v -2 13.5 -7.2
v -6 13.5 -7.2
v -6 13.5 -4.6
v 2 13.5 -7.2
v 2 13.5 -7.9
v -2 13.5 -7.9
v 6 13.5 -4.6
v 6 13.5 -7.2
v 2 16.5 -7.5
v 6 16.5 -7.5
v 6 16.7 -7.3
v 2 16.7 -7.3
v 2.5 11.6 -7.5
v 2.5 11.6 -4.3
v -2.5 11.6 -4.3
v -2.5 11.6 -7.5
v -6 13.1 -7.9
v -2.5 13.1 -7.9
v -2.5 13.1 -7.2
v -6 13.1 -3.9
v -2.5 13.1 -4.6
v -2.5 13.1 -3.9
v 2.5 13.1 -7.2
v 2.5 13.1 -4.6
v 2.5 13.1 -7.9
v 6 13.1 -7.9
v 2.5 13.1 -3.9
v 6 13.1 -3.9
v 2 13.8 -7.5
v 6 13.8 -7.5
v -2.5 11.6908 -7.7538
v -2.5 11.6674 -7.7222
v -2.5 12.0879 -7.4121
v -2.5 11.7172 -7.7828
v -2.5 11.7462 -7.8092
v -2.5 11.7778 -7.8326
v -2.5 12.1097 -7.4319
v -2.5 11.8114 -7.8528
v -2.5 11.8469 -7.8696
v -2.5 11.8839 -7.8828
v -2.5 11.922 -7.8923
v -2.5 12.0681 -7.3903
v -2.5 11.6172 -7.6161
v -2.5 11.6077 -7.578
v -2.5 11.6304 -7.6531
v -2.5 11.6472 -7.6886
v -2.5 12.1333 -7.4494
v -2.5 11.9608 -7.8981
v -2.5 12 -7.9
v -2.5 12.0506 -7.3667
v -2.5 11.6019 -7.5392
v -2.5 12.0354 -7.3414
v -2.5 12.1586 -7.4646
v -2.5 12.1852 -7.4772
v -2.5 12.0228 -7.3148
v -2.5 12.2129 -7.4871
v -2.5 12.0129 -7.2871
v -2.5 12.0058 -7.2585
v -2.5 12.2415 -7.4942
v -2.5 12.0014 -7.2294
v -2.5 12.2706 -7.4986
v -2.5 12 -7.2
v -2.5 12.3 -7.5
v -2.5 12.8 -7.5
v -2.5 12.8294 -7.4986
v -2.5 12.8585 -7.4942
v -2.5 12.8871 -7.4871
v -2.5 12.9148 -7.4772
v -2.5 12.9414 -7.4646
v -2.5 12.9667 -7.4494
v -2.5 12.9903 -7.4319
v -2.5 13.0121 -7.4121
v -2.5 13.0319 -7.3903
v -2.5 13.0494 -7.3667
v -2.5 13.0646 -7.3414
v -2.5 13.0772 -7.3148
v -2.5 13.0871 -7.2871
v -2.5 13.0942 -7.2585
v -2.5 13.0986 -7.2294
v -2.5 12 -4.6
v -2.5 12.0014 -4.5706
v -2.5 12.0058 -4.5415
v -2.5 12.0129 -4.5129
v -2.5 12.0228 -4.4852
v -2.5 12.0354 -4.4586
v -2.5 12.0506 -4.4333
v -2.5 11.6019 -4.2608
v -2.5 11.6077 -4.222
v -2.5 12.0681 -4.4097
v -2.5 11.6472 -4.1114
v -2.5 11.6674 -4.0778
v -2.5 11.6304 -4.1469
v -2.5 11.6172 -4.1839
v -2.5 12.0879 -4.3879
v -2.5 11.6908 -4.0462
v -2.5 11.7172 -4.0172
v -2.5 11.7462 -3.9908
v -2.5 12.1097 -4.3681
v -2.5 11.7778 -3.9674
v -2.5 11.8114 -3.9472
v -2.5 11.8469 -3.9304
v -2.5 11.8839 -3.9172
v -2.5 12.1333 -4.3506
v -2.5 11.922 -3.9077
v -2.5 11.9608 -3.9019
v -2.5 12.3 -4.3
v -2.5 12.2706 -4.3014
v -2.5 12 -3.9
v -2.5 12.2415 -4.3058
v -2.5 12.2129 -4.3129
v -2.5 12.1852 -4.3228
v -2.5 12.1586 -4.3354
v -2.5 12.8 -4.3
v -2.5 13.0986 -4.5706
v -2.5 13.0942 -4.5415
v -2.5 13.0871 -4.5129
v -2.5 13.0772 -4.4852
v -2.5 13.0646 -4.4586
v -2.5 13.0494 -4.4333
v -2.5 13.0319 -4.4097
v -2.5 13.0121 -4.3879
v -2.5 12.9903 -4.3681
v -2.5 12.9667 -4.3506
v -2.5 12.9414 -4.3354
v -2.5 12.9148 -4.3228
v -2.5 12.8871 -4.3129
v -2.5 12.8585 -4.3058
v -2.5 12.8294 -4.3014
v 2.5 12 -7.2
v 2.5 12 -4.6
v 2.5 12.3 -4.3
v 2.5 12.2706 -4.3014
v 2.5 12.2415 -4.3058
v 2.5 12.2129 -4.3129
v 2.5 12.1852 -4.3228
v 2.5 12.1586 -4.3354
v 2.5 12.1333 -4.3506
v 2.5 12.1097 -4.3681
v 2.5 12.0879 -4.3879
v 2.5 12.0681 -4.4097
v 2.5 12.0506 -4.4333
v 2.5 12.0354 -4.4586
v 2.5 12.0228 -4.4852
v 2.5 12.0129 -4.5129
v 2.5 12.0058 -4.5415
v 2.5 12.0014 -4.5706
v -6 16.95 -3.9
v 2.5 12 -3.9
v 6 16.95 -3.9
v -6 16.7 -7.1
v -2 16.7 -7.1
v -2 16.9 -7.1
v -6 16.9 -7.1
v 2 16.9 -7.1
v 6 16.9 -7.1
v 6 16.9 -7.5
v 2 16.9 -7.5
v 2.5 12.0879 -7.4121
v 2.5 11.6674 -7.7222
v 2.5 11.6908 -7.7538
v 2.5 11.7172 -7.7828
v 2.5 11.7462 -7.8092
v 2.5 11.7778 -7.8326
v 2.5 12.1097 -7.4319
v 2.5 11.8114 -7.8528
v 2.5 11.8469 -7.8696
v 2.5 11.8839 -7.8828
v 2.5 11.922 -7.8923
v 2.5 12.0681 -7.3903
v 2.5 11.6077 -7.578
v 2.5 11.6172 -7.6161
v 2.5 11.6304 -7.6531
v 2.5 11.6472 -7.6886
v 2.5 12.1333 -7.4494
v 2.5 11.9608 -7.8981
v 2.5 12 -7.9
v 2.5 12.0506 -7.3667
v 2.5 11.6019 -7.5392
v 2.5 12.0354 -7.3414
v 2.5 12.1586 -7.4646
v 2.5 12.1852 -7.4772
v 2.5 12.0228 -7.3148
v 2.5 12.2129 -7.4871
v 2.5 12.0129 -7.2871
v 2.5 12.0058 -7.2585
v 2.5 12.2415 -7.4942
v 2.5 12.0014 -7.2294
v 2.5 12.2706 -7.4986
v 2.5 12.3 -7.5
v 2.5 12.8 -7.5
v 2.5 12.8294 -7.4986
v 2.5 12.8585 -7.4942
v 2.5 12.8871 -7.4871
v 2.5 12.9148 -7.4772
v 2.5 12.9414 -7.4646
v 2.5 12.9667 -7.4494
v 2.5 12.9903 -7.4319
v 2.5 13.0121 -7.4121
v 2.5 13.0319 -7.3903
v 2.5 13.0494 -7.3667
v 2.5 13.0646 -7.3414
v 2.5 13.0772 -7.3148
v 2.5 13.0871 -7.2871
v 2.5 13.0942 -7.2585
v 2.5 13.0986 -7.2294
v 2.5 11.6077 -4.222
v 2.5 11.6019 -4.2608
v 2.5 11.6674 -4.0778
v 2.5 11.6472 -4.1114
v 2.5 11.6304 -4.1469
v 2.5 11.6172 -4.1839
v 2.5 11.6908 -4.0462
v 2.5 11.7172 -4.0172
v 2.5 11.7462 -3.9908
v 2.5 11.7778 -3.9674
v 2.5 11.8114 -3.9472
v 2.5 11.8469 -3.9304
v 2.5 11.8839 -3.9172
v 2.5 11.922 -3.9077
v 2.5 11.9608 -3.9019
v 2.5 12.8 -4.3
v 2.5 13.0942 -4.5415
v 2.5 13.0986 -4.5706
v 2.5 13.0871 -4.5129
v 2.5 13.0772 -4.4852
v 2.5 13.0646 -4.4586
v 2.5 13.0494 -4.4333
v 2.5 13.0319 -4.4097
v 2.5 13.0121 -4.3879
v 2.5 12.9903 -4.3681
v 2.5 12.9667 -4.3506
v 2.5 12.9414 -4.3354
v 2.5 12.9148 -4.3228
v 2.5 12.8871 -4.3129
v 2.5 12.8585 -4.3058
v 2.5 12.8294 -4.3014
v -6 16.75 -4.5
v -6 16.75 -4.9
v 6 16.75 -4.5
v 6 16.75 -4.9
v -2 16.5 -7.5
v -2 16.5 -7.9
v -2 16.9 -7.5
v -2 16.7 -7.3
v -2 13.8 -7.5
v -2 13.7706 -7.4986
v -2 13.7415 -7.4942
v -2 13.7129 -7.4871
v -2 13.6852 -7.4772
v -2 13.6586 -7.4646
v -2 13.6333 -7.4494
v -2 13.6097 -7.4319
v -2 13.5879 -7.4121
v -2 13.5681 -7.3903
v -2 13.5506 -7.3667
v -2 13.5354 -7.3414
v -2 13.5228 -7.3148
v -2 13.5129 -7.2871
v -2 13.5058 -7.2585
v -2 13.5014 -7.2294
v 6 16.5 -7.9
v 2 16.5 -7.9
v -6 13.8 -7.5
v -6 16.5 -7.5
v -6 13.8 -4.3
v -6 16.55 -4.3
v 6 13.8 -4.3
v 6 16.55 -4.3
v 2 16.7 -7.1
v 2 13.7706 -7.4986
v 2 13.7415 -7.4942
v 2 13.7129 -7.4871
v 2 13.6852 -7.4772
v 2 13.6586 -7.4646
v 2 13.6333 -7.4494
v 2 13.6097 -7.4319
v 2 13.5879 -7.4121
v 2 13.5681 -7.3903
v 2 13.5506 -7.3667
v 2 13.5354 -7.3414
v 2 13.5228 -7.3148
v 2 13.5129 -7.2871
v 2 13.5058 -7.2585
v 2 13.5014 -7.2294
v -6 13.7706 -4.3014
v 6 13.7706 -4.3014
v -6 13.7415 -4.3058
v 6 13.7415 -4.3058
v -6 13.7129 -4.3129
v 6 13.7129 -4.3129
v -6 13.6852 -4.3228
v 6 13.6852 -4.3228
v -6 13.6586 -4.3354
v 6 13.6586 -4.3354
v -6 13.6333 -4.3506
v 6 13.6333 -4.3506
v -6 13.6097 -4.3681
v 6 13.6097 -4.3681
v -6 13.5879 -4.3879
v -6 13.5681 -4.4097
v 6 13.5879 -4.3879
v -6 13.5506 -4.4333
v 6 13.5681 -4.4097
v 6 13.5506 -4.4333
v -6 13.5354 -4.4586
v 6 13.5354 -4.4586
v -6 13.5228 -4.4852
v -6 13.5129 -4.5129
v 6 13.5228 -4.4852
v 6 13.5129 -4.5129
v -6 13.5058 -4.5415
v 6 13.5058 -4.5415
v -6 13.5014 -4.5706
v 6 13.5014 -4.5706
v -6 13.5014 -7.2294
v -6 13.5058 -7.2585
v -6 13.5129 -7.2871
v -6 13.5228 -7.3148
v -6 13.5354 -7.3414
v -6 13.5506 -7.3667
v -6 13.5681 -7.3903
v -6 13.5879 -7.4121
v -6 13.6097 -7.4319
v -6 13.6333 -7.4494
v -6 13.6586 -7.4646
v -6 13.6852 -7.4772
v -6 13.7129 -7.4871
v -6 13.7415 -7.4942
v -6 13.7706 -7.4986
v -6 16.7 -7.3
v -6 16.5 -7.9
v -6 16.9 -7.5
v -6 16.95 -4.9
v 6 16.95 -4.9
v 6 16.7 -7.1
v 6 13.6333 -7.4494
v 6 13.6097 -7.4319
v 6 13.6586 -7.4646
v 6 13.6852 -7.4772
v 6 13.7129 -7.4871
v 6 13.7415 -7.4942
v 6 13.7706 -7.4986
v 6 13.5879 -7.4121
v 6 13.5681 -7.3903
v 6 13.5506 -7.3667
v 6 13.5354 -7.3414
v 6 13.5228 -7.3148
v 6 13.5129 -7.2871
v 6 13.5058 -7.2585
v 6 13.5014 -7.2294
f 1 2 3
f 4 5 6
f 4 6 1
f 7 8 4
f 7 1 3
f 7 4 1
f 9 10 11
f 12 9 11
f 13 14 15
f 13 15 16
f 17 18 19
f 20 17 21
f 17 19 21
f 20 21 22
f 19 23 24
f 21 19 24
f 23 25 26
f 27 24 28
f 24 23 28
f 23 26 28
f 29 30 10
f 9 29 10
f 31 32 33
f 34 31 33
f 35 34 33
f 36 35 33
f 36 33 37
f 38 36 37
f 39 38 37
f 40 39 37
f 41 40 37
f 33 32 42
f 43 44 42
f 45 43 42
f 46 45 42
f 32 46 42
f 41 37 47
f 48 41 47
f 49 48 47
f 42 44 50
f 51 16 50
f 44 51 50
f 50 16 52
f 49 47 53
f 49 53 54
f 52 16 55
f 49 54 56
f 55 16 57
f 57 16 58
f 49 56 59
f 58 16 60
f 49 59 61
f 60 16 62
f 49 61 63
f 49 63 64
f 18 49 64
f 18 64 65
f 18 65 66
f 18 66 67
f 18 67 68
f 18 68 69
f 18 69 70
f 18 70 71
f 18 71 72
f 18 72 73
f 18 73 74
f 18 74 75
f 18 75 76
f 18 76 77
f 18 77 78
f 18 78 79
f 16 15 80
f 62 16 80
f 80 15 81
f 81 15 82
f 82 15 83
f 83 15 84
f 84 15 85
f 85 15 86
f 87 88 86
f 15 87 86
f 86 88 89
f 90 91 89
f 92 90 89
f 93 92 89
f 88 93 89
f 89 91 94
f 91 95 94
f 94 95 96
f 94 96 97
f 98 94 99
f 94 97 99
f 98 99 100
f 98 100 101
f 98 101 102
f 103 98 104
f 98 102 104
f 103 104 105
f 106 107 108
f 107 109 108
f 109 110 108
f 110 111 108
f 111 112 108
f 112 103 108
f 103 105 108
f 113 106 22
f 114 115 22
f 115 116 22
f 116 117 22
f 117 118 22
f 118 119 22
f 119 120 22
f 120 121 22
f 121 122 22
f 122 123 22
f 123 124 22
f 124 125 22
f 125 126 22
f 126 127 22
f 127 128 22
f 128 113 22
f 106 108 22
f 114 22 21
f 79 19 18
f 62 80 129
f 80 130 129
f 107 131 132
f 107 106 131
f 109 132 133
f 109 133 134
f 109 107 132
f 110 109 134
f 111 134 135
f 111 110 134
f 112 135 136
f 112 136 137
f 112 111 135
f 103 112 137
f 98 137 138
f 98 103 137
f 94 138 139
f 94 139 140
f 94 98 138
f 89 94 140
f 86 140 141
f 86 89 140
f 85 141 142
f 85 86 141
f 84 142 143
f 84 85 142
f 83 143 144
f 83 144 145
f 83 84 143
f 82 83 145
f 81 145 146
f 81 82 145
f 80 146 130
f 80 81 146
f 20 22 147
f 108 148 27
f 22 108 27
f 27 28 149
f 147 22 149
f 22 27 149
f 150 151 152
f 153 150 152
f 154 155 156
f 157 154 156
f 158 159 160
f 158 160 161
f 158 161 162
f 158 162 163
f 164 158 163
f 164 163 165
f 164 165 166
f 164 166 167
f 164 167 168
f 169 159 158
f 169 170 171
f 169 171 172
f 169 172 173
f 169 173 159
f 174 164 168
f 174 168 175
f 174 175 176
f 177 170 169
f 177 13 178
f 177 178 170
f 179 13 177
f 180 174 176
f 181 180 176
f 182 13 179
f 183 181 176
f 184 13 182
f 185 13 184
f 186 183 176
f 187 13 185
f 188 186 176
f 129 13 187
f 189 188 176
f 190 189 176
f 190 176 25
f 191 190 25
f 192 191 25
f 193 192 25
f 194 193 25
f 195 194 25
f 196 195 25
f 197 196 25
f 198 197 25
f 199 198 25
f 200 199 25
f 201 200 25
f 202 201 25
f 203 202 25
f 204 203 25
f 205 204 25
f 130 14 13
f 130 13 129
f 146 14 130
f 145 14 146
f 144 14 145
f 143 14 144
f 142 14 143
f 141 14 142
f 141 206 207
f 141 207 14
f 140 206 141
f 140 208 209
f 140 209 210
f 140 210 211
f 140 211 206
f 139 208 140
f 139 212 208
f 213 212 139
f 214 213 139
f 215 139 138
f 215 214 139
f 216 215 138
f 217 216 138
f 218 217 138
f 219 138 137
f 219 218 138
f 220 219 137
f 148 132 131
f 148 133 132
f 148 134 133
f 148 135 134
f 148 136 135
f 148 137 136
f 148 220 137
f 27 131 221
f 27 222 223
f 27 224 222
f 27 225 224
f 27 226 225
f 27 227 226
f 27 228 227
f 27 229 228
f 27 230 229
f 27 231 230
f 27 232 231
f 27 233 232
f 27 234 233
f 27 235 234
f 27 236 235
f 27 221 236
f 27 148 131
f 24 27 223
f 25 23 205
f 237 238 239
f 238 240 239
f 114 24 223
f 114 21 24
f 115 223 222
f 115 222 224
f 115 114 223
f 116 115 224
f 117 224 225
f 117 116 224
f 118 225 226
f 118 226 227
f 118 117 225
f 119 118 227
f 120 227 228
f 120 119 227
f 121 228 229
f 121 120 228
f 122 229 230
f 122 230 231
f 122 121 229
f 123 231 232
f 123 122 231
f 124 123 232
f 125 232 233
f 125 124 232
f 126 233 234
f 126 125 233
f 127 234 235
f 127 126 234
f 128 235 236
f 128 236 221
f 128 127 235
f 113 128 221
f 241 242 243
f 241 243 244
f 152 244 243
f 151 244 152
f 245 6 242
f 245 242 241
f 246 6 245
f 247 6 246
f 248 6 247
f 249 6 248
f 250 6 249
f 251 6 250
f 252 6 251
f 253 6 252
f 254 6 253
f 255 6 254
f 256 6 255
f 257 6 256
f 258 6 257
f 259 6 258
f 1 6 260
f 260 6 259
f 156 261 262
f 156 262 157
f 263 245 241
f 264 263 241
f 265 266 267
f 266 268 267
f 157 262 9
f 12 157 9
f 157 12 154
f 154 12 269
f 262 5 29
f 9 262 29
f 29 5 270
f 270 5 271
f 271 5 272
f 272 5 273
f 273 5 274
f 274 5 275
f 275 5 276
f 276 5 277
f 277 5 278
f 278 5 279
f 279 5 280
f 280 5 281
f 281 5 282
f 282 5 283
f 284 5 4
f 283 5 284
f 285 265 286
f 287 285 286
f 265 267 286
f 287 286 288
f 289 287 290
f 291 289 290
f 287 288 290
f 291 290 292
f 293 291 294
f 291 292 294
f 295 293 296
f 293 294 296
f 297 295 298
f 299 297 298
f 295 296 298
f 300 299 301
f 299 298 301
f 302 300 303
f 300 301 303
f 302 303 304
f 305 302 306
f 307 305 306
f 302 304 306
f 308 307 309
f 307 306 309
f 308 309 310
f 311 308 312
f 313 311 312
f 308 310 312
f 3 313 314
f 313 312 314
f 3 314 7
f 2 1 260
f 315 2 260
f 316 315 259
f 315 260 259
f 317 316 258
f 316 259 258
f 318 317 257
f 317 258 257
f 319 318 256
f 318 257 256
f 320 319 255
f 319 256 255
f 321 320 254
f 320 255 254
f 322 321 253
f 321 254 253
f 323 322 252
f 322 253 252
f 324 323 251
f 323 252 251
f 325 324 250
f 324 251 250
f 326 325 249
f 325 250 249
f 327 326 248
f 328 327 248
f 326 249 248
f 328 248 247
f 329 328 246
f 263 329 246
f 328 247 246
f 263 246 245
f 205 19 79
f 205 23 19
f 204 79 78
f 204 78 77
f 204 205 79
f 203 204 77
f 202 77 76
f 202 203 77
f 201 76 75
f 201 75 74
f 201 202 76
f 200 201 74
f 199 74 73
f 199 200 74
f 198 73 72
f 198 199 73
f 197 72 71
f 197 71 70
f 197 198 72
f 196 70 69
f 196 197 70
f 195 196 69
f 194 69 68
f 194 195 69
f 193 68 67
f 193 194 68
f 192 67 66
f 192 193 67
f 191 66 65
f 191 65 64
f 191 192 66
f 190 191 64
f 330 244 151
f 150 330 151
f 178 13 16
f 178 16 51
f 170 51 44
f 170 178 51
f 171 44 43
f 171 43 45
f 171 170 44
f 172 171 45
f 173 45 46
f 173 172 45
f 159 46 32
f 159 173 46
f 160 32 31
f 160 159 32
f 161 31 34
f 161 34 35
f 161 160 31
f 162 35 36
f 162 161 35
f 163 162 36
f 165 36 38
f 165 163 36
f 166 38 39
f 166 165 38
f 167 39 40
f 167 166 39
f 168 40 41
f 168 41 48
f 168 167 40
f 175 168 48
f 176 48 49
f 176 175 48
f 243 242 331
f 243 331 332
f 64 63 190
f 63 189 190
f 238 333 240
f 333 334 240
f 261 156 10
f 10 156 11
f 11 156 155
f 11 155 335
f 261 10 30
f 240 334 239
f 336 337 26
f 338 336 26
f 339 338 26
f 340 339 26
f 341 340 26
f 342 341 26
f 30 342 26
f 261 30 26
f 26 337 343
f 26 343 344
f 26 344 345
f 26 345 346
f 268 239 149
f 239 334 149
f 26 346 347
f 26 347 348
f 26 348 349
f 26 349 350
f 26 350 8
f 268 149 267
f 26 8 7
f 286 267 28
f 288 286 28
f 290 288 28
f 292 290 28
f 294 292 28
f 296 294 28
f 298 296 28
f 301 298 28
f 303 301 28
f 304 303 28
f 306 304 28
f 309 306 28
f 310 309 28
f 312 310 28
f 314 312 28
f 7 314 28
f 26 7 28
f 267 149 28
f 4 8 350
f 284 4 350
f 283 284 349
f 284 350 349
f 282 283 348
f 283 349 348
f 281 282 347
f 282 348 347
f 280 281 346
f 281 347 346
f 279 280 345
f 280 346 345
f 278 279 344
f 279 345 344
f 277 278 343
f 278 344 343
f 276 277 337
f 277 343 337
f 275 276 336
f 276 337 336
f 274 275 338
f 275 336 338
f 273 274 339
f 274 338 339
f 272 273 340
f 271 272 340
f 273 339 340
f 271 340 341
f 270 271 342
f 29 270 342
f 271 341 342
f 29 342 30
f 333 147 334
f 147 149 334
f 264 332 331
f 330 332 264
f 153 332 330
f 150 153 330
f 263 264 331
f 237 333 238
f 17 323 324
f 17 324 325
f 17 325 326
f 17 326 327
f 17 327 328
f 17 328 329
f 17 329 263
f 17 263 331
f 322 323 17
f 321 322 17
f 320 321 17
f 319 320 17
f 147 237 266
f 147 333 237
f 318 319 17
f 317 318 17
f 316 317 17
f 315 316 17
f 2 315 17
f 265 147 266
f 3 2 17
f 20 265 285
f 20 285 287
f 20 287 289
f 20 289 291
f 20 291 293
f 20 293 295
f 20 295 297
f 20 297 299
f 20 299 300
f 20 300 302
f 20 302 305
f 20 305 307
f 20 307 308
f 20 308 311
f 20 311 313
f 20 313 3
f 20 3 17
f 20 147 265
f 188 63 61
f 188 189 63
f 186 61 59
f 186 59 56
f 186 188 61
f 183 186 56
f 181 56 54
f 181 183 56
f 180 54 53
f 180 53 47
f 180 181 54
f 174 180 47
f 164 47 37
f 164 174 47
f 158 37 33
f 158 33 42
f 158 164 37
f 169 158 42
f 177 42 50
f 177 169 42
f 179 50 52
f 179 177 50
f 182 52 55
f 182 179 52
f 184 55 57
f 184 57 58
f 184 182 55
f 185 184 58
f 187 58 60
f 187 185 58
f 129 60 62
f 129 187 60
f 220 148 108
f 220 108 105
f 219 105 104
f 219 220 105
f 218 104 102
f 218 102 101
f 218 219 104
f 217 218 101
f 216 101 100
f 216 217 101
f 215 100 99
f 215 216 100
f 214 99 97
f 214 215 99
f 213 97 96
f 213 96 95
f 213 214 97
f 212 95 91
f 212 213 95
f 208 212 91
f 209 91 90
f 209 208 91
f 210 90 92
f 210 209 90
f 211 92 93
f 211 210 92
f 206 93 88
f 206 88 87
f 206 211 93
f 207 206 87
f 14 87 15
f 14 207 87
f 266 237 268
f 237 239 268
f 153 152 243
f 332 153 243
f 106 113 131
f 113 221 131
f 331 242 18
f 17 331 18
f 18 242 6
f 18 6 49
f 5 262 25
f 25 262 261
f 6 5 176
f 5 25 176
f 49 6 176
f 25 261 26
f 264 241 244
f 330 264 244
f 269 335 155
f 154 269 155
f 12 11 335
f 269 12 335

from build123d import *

# Parameters (mm, degrees)
PAD011_DEPTH    = 6
SKETCH019_W     = 4
SKETCH019_H     = 4
POCKET002_DEPTH = 3.451
PAD012_DEPTH    = 2.5
FILLET004_R     = 0.3


with BuildPart() as part:
    # Sketch018 → Pad011 (new body, symmetric)
    with BuildSketch(Plane.YZ):
        with BuildLine():
            Line((13.1, -7.9), (13.1, -3.9))
            Line((13.1, -3.9), (16.95, -3.9))
            Line((16.95, -3.9), (16.95, -4.9))
            Line((16.95, -4.9), (16.75, -4.9))
            Line((16.75, -4.9), (16.75, -4.5))
            Line((16.75, -4.5), (16.55, -4.3))
            Line((16.55, -4.3), (13.8, -4.3))
            ThreePointArc((13.8, -4.3), (13.587868, -4.387868), (13.5, -4.6))
            Line((13.5, -4.6), (13.5, -7.2))
            ThreePointArc((13.5, -7.2), (13.587868, -7.412132), (13.8, -7.5))
            Line((13.8, -7.5), (16.5, -7.5))
            Line((16.5, -7.5), (16.7, -7.3))
            Line((16.7, -7.3), (16.7, -7.1))
            Line((16.7, -7.1), (16.9, -7.1))
            Line((16.9, -7.1), (16.9, -7.5))
            Line((16.5, -7.9), (16.9, -7.5))
            Line((16.5, -7.9), (13.1, -7.9))
        make_face()
    extrude(amount=PAD011_DEPTH, both=True)

    # Sketch019 (on Face10 of Pad011) → Pocket002 (cut, through all)
    with BuildSketch(Plane.ZX.offset(13.5)):
        with Locations((-7.9, 0)):
            Rectangle(SKETCH019_W, SKETCH019_H)
    extrude(amount=POCKET002_DEPTH, mode=Mode.SUBTRACT)

    # Sketch020 → Pad012 (join, symmetric)
    with BuildSketch(Plane.YZ):
        with BuildLine():
            Line((13.1, -3.9), (12, -3.9))
            ThreePointArc((12, -3.9), (11.717157, -4.017157), (11.6, -4.3))
            Line((11.6, -4.3), (11.6, -7.5))
            ThreePointArc((11.6, -7.5), (11.717157, -7.782843), (12, -7.9))
            Line((12, -7.9), (13.1, -7.9))
            Line((13.1, -7.9), (13.1, -7.5))
            Line((12, -7.5), (13.1, -7.5))
            Line((12, -4.3), (12, -7.5))
            Line((13.1, -4.3), (12, -4.3))
            Line((13.1, -4.3), (13.1, -3.9))
        make_face()
    extrude(amount=PAD012_DEPTH, both=True)

    # Fillet004
    fillet004_edges = [part.edges().sort_by_distance(p)[0] for p in [
        (0, 12, -4.3),
        (0, 12, -7.5),
        (0, 13.1, -7.5),
        (0, 13.1, -4.3),
    ]]
    fillet(fillet004_edges, radius=FILLET004_R)


solid = part.part
